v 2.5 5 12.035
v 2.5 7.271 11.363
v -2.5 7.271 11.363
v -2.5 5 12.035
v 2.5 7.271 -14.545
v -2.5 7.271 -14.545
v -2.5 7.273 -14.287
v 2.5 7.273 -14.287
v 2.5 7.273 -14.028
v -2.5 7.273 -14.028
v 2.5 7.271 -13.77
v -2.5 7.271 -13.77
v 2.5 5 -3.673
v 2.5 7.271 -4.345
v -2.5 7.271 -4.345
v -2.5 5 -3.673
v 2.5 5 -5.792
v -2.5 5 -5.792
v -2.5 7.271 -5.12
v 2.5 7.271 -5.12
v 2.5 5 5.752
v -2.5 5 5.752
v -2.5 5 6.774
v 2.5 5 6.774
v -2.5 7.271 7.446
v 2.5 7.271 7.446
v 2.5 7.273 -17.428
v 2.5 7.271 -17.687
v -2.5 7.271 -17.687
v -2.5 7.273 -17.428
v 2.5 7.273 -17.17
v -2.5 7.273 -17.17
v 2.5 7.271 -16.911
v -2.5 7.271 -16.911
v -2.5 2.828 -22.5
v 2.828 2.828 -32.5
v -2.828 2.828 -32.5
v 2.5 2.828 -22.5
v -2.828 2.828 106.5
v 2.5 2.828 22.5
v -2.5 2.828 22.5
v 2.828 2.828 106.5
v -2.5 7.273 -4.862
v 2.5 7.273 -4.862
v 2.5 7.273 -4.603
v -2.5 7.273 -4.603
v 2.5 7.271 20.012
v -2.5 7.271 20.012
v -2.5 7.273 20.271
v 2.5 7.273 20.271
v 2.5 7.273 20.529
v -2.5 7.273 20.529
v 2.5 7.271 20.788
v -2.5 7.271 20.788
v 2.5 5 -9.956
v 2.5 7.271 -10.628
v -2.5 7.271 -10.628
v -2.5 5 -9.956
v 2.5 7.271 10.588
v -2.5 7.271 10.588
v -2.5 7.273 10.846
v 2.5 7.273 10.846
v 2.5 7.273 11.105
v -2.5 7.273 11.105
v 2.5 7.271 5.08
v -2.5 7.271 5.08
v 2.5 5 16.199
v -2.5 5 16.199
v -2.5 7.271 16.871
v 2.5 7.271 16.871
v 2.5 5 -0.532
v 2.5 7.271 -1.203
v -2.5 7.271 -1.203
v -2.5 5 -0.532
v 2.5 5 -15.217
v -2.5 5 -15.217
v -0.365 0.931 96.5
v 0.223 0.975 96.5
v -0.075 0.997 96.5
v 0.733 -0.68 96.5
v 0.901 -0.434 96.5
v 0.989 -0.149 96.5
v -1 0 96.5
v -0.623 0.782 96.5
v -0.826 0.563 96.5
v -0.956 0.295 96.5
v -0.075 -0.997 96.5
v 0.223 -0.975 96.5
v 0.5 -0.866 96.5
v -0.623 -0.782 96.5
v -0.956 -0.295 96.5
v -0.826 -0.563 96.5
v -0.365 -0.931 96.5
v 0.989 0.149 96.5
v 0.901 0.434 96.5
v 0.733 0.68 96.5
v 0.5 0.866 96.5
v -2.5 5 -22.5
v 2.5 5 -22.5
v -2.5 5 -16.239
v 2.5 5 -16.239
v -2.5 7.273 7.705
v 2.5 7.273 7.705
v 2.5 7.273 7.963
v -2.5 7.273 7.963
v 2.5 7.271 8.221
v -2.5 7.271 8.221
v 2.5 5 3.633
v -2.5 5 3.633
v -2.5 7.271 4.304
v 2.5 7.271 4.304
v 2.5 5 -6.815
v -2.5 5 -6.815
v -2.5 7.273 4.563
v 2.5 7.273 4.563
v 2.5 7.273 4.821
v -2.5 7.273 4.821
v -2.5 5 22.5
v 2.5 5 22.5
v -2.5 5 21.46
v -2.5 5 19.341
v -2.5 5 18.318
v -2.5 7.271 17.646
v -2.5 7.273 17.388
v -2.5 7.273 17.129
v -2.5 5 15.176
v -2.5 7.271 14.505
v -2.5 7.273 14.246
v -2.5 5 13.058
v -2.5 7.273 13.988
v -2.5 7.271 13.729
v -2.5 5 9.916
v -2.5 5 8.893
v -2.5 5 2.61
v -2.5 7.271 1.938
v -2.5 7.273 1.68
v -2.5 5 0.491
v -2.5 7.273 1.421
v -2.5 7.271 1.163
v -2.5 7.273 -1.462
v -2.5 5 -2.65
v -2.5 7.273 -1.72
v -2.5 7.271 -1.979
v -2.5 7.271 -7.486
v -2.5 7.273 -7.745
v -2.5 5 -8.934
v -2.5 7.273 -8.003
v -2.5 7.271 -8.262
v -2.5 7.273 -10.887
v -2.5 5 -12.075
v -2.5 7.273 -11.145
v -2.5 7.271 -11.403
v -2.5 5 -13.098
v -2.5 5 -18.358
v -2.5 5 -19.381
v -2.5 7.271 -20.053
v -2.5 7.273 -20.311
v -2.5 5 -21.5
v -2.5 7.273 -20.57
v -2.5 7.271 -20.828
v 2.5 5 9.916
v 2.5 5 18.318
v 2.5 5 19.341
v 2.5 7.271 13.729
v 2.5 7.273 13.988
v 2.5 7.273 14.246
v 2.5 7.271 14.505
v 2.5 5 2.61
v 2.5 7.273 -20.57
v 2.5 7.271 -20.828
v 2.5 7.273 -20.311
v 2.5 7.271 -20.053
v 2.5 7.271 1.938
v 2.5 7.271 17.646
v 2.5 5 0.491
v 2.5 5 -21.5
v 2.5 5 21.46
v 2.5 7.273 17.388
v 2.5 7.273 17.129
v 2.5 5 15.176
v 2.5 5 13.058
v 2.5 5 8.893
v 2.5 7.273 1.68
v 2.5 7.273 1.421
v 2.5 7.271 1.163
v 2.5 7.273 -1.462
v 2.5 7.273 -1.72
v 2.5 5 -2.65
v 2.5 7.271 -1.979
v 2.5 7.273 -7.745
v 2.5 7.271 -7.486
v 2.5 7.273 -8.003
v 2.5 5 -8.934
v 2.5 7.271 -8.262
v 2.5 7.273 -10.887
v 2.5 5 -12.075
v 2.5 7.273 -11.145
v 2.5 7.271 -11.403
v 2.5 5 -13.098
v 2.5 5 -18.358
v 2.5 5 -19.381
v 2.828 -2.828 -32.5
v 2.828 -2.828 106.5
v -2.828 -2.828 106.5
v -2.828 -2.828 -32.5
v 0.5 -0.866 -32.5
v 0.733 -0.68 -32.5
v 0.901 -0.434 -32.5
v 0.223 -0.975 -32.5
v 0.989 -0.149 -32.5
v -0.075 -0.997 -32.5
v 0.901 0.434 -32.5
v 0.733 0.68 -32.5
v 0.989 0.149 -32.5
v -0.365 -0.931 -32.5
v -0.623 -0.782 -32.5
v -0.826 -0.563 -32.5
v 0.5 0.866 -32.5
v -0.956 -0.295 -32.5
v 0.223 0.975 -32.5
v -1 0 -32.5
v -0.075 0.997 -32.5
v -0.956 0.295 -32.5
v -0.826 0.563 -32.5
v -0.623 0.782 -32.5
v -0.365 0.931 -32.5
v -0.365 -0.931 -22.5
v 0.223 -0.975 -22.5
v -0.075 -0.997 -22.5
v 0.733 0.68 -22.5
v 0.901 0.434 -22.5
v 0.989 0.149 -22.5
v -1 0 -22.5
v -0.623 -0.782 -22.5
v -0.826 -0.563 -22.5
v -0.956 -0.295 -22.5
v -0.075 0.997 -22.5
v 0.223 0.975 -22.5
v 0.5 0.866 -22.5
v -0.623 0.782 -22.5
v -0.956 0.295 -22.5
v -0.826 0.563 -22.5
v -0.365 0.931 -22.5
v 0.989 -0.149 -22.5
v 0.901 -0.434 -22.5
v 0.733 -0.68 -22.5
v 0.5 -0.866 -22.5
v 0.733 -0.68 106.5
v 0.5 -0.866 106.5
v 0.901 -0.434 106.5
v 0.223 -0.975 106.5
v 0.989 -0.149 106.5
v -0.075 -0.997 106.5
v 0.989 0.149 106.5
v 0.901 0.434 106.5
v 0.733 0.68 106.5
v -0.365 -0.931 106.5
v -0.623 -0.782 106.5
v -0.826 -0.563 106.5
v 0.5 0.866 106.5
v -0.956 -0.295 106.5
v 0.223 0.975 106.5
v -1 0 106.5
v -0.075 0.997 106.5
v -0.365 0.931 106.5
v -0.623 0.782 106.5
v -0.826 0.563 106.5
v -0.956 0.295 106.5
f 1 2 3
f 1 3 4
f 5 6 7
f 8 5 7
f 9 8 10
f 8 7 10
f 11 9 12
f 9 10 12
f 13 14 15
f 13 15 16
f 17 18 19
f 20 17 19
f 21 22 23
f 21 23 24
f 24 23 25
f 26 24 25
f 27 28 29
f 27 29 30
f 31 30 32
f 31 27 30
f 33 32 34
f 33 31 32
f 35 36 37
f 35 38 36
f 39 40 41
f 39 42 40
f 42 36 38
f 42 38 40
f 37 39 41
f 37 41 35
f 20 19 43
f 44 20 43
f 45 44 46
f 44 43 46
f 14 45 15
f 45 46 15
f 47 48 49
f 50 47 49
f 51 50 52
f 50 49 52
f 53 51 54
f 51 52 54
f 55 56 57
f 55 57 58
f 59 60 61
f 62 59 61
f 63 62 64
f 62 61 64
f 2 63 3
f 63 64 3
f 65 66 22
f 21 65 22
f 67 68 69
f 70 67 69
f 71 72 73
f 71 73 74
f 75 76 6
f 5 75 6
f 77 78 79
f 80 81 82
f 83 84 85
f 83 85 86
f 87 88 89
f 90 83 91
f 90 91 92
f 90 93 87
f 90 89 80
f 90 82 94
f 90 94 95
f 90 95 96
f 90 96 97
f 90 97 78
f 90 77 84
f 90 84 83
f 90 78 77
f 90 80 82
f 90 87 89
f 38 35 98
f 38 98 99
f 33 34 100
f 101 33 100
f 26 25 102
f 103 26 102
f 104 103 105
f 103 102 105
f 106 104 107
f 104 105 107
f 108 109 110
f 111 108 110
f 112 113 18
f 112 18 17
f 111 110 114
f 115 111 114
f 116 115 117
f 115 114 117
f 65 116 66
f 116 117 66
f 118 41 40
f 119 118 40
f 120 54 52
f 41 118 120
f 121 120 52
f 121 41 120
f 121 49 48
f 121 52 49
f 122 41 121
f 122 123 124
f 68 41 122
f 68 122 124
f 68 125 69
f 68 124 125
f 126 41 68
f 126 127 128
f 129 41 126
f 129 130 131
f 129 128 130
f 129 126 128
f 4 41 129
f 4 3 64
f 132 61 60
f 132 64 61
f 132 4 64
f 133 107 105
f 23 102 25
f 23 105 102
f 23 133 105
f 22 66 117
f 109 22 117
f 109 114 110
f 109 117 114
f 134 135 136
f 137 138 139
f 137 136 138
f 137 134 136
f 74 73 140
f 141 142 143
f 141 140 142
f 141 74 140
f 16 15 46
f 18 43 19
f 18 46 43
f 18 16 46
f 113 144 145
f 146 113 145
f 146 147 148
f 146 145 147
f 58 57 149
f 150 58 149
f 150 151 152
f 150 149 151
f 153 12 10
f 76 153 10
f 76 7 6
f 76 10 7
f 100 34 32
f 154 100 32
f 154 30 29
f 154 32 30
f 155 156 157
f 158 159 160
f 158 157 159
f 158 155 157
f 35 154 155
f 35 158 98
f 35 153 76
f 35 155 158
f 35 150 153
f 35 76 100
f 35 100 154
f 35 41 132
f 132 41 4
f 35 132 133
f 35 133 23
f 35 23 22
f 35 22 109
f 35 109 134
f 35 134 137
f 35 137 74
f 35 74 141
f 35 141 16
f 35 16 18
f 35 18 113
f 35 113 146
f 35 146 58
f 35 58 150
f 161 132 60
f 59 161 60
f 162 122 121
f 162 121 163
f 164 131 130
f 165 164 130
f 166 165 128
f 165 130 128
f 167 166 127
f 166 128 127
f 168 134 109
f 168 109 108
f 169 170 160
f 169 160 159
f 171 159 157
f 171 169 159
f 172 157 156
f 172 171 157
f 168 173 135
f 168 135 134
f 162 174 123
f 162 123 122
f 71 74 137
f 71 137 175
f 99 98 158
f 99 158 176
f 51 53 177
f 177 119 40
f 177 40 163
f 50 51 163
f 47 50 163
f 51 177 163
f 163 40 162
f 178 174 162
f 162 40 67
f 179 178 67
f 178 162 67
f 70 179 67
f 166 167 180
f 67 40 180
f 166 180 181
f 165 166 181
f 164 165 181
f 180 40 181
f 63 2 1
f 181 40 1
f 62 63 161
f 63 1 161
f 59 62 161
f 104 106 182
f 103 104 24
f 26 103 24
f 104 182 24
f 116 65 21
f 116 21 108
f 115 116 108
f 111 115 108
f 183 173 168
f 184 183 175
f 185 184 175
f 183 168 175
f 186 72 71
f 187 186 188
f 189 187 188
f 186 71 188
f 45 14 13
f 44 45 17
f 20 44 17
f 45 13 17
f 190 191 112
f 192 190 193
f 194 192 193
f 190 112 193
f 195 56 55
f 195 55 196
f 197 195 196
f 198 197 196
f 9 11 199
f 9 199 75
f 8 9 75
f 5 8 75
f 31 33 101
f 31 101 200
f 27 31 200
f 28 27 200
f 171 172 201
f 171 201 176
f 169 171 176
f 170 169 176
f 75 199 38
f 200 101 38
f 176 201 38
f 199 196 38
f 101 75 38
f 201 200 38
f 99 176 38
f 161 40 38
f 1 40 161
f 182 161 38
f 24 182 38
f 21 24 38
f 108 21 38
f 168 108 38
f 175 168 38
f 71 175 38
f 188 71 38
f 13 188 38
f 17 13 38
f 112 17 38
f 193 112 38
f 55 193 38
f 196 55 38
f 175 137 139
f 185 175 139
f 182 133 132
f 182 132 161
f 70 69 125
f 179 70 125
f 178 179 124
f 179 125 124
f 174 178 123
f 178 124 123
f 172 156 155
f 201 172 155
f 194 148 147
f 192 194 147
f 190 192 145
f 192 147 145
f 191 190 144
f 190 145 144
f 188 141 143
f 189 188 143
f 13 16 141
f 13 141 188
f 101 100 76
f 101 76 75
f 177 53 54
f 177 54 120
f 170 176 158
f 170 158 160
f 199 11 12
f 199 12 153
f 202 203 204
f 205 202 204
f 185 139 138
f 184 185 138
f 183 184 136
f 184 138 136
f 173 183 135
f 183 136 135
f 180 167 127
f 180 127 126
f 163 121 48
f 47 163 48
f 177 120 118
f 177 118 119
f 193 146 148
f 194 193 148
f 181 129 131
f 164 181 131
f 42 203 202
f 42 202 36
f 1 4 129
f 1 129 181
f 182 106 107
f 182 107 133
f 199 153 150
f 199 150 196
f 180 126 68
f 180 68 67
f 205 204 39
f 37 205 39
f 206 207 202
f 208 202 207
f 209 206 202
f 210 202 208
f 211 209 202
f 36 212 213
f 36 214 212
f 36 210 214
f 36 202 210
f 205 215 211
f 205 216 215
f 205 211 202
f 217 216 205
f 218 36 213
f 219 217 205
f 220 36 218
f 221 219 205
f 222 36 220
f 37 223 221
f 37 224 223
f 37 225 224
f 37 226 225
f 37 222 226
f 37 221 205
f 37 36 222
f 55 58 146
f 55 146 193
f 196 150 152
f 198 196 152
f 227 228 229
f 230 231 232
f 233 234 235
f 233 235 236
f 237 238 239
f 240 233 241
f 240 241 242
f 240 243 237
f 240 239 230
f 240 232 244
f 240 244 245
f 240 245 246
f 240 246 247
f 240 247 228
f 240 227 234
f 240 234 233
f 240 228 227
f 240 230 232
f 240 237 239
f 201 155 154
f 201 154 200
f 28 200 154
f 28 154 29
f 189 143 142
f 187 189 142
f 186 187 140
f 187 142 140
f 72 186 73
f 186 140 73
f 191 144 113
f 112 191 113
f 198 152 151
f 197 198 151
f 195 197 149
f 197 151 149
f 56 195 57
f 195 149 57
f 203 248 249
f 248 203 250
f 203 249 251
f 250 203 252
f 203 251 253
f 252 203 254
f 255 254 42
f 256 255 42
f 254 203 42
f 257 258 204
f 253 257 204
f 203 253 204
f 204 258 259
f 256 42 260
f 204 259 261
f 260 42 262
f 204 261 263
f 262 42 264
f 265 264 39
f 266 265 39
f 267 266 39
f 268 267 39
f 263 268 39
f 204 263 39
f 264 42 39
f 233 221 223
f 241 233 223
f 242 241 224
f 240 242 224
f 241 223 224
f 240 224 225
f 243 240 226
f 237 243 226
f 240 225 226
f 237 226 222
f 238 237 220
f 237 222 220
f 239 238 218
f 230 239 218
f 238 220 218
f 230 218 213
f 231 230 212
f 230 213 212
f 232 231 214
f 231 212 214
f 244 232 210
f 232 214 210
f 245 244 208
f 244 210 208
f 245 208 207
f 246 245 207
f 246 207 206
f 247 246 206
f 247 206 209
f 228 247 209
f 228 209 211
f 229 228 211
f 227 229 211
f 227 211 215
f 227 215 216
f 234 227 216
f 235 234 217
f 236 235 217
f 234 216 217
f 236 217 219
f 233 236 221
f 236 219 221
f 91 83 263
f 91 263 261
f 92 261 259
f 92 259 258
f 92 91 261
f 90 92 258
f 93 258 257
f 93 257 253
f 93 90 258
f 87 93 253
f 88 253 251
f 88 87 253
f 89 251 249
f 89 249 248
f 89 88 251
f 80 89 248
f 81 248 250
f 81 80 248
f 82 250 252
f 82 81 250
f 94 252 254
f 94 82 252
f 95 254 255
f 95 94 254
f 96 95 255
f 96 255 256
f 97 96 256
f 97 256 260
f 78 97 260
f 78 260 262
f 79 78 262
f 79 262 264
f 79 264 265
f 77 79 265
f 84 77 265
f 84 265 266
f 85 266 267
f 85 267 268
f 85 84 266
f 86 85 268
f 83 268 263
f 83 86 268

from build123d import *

# Parameters (mm, degrees)
ESQUISSE1_W                    = 5
ESQUISSE1_H                    = 45
BOSS_EXTRU_1_DEPTH             = 5
CARR_DEPTH                     = 10
CARR_DEPTH_BACK                = 129
ESQUISSE7_W                    = 5.65685425
ESQUISSE7_H                    = 5.65685425
BOSS_EXTRU_3_REACH             = 108.655
BOSS_EXTRU_3_DIRECTION_2_REACH = 108.655
R_P_TITION_LIN_AIRE1_COUNT     = 14
R_P_TITION_LIN_AIRE1_PITCH     = 3.141592
ESQUISSE8_R                    = 1
ENL_V_MAT_EXTRU_3_DEPTH        = 10
ENL_V_START                    = -10
ESQUISSE9_R                    = 1
ENL_V_MAT_EXTRU_4_DEPTH        = 10


with BuildPart() as part:
    # Esquisse1 → Boss.-Extru.1 (new body)
    with BuildSketch(Plane(origin=(0, 0, 0), x_dir=(1, 0, 0), z_dir=(0, 1, 0))):
        Rectangle(ESQUISSE1_W, ESQUISSE1_H)
    extrude(amount=BOSS_EXTRU_1_DEPTH)

    # Esquisse7 → Carré (add, two sides: drawn at the far end of the back side and taken through both)
    with BuildSketch(Plane(origin=(0, 0, -22.5), x_dir=(-1, 0, 0), z_dir=(0, 0, -1)).offset(-CARR_DEPTH_BACK)):
        Rectangle(ESQUISSE7_W, ESQUISSE7_H)
    extrude(amount=CARR_DEPTH + CARR_DEPTH_BACK)

    # Boss.-Extru.3: up to this face of the body (flat: up to its plane)
    boss_extru_3_end = Plane(part.part.faces().sort_by_distance((2.5, 3.914213562, 0))[0])
    # Esquisse3 → Boss.-Extru.3 (add, up to the picked face)
    with BuildSketch(Plane(origin=(0, 0, 0), x_dir=(0, 0, -1), z_dir=(1, 0, 0)), mode=Mode.PRIVATE) as boss_extru_3_sk1:
        with BuildLine():
            Line((19.381081141, 5), (21.5, 5))
            Line((21.5, 5), (20.828241228, 7.270751612))
            ThreePointArc((20.828241228, 7.270751612), (20.440540571, 7.273642384), (20.052839914, 7.270751612))
            Line((20.052839914, 7.270751612), (19.381081141, 5))
        make_face()
    boss_extru_3_tool1 = split(extrude(boss_extru_3_sk1.sketch, amount=BOSS_EXTRU_3_REACH, mode=Mode.PRIVATE), bisect_by=boss_extru_3_end, keep=Keep.BOTH, mode=Mode.PRIVATE)
    boss_extru_3 = boss_extru_3_tool1.solids().sort_by(Axis((0, 5.960295, -20.440541), (1, 0, 0)))[0]
    add(boss_extru_3)

    # Boss.-Extru.3 direction 2: up to this face of the body (flat: up to its plane)
    boss_extru_3_direction_2_end = Plane(part.part.faces().sort_by_distance((-2.5, 3.914213562, 0))[0])
    # Esquisse3 → Boss.-Extru.3 direction 2 (add, up to the picked face)
    with BuildSketch(Plane(origin=(0, 0, 0), x_dir=(0, 0, -1), z_dir=(1, 0, 0)), mode=Mode.PRIVATE) as boss_extru_3_direction_2_sk1:
        with BuildLine():
            Line((19.381081141, 5), (21.5, 5))
            Line((21.5, 5), (20.828241228, 7.270751612))
            ThreePointArc((20.828241228, 7.270751612), (20.440540571, 7.273642384), (20.052839914, 7.270751612))
            Line((20.052839914, 7.270751612), (19.381081141, 5))
        make_face()
    boss_extru_3_direction_2_tool1 = split(extrude(boss_extru_3_direction_2_sk1.sketch, amount=-BOSS_EXTRU_3_DIRECTION_2_REACH, mode=Mode.PRIVATE), bisect_by=boss_extru_3_direction_2_end, keep=Keep.BOTH, mode=Mode.PRIVATE)
    boss_extru_3_direction_2 = boss_extru_3_direction_2_tool1.solids().sort_by(Axis((0, 5.960295, -20.440541), (-1, 0, 0)))[0]
    add(boss_extru_3_direction_2)

    # Répétition linéaire1: Boss.-Extru.3, Boss.-Extru.3 direction 2 ×14
    with Locations(*[(0, 0, i * R_P_TITION_LIN_AIRE1_PITCH) for i in range(1, R_P_TITION_LIN_AIRE1_COUNT)]):
        add(boss_extru_3)
        add(boss_extru_3_direction_2)

    # Esquisse8 → Enlèv. mat.-Extru.3 (cut)
    with BuildSketch(Plane(origin=(0, 0, -32.5), x_dir=(-1, 0, 0), z_dir=(0, 0, -1))):
        Circle(ESQUISSE8_R)
    extrude(amount=-ENL_V_MAT_EXTRU_3_DEPTH, mode=Mode.SUBTRACT)

    # Esquisse9 → Enlèv. mat.-Extru.4 (cut)
    with BuildSketch(Plane.XY.offset(106.5).offset(ENL_V_START)):
        Circle(ESQUISSE9_R)
    extrude(amount=ENL_V_MAT_EXTRU_4_DEPTH, mode=Mode.SUBTRACT)


solid = part.part
